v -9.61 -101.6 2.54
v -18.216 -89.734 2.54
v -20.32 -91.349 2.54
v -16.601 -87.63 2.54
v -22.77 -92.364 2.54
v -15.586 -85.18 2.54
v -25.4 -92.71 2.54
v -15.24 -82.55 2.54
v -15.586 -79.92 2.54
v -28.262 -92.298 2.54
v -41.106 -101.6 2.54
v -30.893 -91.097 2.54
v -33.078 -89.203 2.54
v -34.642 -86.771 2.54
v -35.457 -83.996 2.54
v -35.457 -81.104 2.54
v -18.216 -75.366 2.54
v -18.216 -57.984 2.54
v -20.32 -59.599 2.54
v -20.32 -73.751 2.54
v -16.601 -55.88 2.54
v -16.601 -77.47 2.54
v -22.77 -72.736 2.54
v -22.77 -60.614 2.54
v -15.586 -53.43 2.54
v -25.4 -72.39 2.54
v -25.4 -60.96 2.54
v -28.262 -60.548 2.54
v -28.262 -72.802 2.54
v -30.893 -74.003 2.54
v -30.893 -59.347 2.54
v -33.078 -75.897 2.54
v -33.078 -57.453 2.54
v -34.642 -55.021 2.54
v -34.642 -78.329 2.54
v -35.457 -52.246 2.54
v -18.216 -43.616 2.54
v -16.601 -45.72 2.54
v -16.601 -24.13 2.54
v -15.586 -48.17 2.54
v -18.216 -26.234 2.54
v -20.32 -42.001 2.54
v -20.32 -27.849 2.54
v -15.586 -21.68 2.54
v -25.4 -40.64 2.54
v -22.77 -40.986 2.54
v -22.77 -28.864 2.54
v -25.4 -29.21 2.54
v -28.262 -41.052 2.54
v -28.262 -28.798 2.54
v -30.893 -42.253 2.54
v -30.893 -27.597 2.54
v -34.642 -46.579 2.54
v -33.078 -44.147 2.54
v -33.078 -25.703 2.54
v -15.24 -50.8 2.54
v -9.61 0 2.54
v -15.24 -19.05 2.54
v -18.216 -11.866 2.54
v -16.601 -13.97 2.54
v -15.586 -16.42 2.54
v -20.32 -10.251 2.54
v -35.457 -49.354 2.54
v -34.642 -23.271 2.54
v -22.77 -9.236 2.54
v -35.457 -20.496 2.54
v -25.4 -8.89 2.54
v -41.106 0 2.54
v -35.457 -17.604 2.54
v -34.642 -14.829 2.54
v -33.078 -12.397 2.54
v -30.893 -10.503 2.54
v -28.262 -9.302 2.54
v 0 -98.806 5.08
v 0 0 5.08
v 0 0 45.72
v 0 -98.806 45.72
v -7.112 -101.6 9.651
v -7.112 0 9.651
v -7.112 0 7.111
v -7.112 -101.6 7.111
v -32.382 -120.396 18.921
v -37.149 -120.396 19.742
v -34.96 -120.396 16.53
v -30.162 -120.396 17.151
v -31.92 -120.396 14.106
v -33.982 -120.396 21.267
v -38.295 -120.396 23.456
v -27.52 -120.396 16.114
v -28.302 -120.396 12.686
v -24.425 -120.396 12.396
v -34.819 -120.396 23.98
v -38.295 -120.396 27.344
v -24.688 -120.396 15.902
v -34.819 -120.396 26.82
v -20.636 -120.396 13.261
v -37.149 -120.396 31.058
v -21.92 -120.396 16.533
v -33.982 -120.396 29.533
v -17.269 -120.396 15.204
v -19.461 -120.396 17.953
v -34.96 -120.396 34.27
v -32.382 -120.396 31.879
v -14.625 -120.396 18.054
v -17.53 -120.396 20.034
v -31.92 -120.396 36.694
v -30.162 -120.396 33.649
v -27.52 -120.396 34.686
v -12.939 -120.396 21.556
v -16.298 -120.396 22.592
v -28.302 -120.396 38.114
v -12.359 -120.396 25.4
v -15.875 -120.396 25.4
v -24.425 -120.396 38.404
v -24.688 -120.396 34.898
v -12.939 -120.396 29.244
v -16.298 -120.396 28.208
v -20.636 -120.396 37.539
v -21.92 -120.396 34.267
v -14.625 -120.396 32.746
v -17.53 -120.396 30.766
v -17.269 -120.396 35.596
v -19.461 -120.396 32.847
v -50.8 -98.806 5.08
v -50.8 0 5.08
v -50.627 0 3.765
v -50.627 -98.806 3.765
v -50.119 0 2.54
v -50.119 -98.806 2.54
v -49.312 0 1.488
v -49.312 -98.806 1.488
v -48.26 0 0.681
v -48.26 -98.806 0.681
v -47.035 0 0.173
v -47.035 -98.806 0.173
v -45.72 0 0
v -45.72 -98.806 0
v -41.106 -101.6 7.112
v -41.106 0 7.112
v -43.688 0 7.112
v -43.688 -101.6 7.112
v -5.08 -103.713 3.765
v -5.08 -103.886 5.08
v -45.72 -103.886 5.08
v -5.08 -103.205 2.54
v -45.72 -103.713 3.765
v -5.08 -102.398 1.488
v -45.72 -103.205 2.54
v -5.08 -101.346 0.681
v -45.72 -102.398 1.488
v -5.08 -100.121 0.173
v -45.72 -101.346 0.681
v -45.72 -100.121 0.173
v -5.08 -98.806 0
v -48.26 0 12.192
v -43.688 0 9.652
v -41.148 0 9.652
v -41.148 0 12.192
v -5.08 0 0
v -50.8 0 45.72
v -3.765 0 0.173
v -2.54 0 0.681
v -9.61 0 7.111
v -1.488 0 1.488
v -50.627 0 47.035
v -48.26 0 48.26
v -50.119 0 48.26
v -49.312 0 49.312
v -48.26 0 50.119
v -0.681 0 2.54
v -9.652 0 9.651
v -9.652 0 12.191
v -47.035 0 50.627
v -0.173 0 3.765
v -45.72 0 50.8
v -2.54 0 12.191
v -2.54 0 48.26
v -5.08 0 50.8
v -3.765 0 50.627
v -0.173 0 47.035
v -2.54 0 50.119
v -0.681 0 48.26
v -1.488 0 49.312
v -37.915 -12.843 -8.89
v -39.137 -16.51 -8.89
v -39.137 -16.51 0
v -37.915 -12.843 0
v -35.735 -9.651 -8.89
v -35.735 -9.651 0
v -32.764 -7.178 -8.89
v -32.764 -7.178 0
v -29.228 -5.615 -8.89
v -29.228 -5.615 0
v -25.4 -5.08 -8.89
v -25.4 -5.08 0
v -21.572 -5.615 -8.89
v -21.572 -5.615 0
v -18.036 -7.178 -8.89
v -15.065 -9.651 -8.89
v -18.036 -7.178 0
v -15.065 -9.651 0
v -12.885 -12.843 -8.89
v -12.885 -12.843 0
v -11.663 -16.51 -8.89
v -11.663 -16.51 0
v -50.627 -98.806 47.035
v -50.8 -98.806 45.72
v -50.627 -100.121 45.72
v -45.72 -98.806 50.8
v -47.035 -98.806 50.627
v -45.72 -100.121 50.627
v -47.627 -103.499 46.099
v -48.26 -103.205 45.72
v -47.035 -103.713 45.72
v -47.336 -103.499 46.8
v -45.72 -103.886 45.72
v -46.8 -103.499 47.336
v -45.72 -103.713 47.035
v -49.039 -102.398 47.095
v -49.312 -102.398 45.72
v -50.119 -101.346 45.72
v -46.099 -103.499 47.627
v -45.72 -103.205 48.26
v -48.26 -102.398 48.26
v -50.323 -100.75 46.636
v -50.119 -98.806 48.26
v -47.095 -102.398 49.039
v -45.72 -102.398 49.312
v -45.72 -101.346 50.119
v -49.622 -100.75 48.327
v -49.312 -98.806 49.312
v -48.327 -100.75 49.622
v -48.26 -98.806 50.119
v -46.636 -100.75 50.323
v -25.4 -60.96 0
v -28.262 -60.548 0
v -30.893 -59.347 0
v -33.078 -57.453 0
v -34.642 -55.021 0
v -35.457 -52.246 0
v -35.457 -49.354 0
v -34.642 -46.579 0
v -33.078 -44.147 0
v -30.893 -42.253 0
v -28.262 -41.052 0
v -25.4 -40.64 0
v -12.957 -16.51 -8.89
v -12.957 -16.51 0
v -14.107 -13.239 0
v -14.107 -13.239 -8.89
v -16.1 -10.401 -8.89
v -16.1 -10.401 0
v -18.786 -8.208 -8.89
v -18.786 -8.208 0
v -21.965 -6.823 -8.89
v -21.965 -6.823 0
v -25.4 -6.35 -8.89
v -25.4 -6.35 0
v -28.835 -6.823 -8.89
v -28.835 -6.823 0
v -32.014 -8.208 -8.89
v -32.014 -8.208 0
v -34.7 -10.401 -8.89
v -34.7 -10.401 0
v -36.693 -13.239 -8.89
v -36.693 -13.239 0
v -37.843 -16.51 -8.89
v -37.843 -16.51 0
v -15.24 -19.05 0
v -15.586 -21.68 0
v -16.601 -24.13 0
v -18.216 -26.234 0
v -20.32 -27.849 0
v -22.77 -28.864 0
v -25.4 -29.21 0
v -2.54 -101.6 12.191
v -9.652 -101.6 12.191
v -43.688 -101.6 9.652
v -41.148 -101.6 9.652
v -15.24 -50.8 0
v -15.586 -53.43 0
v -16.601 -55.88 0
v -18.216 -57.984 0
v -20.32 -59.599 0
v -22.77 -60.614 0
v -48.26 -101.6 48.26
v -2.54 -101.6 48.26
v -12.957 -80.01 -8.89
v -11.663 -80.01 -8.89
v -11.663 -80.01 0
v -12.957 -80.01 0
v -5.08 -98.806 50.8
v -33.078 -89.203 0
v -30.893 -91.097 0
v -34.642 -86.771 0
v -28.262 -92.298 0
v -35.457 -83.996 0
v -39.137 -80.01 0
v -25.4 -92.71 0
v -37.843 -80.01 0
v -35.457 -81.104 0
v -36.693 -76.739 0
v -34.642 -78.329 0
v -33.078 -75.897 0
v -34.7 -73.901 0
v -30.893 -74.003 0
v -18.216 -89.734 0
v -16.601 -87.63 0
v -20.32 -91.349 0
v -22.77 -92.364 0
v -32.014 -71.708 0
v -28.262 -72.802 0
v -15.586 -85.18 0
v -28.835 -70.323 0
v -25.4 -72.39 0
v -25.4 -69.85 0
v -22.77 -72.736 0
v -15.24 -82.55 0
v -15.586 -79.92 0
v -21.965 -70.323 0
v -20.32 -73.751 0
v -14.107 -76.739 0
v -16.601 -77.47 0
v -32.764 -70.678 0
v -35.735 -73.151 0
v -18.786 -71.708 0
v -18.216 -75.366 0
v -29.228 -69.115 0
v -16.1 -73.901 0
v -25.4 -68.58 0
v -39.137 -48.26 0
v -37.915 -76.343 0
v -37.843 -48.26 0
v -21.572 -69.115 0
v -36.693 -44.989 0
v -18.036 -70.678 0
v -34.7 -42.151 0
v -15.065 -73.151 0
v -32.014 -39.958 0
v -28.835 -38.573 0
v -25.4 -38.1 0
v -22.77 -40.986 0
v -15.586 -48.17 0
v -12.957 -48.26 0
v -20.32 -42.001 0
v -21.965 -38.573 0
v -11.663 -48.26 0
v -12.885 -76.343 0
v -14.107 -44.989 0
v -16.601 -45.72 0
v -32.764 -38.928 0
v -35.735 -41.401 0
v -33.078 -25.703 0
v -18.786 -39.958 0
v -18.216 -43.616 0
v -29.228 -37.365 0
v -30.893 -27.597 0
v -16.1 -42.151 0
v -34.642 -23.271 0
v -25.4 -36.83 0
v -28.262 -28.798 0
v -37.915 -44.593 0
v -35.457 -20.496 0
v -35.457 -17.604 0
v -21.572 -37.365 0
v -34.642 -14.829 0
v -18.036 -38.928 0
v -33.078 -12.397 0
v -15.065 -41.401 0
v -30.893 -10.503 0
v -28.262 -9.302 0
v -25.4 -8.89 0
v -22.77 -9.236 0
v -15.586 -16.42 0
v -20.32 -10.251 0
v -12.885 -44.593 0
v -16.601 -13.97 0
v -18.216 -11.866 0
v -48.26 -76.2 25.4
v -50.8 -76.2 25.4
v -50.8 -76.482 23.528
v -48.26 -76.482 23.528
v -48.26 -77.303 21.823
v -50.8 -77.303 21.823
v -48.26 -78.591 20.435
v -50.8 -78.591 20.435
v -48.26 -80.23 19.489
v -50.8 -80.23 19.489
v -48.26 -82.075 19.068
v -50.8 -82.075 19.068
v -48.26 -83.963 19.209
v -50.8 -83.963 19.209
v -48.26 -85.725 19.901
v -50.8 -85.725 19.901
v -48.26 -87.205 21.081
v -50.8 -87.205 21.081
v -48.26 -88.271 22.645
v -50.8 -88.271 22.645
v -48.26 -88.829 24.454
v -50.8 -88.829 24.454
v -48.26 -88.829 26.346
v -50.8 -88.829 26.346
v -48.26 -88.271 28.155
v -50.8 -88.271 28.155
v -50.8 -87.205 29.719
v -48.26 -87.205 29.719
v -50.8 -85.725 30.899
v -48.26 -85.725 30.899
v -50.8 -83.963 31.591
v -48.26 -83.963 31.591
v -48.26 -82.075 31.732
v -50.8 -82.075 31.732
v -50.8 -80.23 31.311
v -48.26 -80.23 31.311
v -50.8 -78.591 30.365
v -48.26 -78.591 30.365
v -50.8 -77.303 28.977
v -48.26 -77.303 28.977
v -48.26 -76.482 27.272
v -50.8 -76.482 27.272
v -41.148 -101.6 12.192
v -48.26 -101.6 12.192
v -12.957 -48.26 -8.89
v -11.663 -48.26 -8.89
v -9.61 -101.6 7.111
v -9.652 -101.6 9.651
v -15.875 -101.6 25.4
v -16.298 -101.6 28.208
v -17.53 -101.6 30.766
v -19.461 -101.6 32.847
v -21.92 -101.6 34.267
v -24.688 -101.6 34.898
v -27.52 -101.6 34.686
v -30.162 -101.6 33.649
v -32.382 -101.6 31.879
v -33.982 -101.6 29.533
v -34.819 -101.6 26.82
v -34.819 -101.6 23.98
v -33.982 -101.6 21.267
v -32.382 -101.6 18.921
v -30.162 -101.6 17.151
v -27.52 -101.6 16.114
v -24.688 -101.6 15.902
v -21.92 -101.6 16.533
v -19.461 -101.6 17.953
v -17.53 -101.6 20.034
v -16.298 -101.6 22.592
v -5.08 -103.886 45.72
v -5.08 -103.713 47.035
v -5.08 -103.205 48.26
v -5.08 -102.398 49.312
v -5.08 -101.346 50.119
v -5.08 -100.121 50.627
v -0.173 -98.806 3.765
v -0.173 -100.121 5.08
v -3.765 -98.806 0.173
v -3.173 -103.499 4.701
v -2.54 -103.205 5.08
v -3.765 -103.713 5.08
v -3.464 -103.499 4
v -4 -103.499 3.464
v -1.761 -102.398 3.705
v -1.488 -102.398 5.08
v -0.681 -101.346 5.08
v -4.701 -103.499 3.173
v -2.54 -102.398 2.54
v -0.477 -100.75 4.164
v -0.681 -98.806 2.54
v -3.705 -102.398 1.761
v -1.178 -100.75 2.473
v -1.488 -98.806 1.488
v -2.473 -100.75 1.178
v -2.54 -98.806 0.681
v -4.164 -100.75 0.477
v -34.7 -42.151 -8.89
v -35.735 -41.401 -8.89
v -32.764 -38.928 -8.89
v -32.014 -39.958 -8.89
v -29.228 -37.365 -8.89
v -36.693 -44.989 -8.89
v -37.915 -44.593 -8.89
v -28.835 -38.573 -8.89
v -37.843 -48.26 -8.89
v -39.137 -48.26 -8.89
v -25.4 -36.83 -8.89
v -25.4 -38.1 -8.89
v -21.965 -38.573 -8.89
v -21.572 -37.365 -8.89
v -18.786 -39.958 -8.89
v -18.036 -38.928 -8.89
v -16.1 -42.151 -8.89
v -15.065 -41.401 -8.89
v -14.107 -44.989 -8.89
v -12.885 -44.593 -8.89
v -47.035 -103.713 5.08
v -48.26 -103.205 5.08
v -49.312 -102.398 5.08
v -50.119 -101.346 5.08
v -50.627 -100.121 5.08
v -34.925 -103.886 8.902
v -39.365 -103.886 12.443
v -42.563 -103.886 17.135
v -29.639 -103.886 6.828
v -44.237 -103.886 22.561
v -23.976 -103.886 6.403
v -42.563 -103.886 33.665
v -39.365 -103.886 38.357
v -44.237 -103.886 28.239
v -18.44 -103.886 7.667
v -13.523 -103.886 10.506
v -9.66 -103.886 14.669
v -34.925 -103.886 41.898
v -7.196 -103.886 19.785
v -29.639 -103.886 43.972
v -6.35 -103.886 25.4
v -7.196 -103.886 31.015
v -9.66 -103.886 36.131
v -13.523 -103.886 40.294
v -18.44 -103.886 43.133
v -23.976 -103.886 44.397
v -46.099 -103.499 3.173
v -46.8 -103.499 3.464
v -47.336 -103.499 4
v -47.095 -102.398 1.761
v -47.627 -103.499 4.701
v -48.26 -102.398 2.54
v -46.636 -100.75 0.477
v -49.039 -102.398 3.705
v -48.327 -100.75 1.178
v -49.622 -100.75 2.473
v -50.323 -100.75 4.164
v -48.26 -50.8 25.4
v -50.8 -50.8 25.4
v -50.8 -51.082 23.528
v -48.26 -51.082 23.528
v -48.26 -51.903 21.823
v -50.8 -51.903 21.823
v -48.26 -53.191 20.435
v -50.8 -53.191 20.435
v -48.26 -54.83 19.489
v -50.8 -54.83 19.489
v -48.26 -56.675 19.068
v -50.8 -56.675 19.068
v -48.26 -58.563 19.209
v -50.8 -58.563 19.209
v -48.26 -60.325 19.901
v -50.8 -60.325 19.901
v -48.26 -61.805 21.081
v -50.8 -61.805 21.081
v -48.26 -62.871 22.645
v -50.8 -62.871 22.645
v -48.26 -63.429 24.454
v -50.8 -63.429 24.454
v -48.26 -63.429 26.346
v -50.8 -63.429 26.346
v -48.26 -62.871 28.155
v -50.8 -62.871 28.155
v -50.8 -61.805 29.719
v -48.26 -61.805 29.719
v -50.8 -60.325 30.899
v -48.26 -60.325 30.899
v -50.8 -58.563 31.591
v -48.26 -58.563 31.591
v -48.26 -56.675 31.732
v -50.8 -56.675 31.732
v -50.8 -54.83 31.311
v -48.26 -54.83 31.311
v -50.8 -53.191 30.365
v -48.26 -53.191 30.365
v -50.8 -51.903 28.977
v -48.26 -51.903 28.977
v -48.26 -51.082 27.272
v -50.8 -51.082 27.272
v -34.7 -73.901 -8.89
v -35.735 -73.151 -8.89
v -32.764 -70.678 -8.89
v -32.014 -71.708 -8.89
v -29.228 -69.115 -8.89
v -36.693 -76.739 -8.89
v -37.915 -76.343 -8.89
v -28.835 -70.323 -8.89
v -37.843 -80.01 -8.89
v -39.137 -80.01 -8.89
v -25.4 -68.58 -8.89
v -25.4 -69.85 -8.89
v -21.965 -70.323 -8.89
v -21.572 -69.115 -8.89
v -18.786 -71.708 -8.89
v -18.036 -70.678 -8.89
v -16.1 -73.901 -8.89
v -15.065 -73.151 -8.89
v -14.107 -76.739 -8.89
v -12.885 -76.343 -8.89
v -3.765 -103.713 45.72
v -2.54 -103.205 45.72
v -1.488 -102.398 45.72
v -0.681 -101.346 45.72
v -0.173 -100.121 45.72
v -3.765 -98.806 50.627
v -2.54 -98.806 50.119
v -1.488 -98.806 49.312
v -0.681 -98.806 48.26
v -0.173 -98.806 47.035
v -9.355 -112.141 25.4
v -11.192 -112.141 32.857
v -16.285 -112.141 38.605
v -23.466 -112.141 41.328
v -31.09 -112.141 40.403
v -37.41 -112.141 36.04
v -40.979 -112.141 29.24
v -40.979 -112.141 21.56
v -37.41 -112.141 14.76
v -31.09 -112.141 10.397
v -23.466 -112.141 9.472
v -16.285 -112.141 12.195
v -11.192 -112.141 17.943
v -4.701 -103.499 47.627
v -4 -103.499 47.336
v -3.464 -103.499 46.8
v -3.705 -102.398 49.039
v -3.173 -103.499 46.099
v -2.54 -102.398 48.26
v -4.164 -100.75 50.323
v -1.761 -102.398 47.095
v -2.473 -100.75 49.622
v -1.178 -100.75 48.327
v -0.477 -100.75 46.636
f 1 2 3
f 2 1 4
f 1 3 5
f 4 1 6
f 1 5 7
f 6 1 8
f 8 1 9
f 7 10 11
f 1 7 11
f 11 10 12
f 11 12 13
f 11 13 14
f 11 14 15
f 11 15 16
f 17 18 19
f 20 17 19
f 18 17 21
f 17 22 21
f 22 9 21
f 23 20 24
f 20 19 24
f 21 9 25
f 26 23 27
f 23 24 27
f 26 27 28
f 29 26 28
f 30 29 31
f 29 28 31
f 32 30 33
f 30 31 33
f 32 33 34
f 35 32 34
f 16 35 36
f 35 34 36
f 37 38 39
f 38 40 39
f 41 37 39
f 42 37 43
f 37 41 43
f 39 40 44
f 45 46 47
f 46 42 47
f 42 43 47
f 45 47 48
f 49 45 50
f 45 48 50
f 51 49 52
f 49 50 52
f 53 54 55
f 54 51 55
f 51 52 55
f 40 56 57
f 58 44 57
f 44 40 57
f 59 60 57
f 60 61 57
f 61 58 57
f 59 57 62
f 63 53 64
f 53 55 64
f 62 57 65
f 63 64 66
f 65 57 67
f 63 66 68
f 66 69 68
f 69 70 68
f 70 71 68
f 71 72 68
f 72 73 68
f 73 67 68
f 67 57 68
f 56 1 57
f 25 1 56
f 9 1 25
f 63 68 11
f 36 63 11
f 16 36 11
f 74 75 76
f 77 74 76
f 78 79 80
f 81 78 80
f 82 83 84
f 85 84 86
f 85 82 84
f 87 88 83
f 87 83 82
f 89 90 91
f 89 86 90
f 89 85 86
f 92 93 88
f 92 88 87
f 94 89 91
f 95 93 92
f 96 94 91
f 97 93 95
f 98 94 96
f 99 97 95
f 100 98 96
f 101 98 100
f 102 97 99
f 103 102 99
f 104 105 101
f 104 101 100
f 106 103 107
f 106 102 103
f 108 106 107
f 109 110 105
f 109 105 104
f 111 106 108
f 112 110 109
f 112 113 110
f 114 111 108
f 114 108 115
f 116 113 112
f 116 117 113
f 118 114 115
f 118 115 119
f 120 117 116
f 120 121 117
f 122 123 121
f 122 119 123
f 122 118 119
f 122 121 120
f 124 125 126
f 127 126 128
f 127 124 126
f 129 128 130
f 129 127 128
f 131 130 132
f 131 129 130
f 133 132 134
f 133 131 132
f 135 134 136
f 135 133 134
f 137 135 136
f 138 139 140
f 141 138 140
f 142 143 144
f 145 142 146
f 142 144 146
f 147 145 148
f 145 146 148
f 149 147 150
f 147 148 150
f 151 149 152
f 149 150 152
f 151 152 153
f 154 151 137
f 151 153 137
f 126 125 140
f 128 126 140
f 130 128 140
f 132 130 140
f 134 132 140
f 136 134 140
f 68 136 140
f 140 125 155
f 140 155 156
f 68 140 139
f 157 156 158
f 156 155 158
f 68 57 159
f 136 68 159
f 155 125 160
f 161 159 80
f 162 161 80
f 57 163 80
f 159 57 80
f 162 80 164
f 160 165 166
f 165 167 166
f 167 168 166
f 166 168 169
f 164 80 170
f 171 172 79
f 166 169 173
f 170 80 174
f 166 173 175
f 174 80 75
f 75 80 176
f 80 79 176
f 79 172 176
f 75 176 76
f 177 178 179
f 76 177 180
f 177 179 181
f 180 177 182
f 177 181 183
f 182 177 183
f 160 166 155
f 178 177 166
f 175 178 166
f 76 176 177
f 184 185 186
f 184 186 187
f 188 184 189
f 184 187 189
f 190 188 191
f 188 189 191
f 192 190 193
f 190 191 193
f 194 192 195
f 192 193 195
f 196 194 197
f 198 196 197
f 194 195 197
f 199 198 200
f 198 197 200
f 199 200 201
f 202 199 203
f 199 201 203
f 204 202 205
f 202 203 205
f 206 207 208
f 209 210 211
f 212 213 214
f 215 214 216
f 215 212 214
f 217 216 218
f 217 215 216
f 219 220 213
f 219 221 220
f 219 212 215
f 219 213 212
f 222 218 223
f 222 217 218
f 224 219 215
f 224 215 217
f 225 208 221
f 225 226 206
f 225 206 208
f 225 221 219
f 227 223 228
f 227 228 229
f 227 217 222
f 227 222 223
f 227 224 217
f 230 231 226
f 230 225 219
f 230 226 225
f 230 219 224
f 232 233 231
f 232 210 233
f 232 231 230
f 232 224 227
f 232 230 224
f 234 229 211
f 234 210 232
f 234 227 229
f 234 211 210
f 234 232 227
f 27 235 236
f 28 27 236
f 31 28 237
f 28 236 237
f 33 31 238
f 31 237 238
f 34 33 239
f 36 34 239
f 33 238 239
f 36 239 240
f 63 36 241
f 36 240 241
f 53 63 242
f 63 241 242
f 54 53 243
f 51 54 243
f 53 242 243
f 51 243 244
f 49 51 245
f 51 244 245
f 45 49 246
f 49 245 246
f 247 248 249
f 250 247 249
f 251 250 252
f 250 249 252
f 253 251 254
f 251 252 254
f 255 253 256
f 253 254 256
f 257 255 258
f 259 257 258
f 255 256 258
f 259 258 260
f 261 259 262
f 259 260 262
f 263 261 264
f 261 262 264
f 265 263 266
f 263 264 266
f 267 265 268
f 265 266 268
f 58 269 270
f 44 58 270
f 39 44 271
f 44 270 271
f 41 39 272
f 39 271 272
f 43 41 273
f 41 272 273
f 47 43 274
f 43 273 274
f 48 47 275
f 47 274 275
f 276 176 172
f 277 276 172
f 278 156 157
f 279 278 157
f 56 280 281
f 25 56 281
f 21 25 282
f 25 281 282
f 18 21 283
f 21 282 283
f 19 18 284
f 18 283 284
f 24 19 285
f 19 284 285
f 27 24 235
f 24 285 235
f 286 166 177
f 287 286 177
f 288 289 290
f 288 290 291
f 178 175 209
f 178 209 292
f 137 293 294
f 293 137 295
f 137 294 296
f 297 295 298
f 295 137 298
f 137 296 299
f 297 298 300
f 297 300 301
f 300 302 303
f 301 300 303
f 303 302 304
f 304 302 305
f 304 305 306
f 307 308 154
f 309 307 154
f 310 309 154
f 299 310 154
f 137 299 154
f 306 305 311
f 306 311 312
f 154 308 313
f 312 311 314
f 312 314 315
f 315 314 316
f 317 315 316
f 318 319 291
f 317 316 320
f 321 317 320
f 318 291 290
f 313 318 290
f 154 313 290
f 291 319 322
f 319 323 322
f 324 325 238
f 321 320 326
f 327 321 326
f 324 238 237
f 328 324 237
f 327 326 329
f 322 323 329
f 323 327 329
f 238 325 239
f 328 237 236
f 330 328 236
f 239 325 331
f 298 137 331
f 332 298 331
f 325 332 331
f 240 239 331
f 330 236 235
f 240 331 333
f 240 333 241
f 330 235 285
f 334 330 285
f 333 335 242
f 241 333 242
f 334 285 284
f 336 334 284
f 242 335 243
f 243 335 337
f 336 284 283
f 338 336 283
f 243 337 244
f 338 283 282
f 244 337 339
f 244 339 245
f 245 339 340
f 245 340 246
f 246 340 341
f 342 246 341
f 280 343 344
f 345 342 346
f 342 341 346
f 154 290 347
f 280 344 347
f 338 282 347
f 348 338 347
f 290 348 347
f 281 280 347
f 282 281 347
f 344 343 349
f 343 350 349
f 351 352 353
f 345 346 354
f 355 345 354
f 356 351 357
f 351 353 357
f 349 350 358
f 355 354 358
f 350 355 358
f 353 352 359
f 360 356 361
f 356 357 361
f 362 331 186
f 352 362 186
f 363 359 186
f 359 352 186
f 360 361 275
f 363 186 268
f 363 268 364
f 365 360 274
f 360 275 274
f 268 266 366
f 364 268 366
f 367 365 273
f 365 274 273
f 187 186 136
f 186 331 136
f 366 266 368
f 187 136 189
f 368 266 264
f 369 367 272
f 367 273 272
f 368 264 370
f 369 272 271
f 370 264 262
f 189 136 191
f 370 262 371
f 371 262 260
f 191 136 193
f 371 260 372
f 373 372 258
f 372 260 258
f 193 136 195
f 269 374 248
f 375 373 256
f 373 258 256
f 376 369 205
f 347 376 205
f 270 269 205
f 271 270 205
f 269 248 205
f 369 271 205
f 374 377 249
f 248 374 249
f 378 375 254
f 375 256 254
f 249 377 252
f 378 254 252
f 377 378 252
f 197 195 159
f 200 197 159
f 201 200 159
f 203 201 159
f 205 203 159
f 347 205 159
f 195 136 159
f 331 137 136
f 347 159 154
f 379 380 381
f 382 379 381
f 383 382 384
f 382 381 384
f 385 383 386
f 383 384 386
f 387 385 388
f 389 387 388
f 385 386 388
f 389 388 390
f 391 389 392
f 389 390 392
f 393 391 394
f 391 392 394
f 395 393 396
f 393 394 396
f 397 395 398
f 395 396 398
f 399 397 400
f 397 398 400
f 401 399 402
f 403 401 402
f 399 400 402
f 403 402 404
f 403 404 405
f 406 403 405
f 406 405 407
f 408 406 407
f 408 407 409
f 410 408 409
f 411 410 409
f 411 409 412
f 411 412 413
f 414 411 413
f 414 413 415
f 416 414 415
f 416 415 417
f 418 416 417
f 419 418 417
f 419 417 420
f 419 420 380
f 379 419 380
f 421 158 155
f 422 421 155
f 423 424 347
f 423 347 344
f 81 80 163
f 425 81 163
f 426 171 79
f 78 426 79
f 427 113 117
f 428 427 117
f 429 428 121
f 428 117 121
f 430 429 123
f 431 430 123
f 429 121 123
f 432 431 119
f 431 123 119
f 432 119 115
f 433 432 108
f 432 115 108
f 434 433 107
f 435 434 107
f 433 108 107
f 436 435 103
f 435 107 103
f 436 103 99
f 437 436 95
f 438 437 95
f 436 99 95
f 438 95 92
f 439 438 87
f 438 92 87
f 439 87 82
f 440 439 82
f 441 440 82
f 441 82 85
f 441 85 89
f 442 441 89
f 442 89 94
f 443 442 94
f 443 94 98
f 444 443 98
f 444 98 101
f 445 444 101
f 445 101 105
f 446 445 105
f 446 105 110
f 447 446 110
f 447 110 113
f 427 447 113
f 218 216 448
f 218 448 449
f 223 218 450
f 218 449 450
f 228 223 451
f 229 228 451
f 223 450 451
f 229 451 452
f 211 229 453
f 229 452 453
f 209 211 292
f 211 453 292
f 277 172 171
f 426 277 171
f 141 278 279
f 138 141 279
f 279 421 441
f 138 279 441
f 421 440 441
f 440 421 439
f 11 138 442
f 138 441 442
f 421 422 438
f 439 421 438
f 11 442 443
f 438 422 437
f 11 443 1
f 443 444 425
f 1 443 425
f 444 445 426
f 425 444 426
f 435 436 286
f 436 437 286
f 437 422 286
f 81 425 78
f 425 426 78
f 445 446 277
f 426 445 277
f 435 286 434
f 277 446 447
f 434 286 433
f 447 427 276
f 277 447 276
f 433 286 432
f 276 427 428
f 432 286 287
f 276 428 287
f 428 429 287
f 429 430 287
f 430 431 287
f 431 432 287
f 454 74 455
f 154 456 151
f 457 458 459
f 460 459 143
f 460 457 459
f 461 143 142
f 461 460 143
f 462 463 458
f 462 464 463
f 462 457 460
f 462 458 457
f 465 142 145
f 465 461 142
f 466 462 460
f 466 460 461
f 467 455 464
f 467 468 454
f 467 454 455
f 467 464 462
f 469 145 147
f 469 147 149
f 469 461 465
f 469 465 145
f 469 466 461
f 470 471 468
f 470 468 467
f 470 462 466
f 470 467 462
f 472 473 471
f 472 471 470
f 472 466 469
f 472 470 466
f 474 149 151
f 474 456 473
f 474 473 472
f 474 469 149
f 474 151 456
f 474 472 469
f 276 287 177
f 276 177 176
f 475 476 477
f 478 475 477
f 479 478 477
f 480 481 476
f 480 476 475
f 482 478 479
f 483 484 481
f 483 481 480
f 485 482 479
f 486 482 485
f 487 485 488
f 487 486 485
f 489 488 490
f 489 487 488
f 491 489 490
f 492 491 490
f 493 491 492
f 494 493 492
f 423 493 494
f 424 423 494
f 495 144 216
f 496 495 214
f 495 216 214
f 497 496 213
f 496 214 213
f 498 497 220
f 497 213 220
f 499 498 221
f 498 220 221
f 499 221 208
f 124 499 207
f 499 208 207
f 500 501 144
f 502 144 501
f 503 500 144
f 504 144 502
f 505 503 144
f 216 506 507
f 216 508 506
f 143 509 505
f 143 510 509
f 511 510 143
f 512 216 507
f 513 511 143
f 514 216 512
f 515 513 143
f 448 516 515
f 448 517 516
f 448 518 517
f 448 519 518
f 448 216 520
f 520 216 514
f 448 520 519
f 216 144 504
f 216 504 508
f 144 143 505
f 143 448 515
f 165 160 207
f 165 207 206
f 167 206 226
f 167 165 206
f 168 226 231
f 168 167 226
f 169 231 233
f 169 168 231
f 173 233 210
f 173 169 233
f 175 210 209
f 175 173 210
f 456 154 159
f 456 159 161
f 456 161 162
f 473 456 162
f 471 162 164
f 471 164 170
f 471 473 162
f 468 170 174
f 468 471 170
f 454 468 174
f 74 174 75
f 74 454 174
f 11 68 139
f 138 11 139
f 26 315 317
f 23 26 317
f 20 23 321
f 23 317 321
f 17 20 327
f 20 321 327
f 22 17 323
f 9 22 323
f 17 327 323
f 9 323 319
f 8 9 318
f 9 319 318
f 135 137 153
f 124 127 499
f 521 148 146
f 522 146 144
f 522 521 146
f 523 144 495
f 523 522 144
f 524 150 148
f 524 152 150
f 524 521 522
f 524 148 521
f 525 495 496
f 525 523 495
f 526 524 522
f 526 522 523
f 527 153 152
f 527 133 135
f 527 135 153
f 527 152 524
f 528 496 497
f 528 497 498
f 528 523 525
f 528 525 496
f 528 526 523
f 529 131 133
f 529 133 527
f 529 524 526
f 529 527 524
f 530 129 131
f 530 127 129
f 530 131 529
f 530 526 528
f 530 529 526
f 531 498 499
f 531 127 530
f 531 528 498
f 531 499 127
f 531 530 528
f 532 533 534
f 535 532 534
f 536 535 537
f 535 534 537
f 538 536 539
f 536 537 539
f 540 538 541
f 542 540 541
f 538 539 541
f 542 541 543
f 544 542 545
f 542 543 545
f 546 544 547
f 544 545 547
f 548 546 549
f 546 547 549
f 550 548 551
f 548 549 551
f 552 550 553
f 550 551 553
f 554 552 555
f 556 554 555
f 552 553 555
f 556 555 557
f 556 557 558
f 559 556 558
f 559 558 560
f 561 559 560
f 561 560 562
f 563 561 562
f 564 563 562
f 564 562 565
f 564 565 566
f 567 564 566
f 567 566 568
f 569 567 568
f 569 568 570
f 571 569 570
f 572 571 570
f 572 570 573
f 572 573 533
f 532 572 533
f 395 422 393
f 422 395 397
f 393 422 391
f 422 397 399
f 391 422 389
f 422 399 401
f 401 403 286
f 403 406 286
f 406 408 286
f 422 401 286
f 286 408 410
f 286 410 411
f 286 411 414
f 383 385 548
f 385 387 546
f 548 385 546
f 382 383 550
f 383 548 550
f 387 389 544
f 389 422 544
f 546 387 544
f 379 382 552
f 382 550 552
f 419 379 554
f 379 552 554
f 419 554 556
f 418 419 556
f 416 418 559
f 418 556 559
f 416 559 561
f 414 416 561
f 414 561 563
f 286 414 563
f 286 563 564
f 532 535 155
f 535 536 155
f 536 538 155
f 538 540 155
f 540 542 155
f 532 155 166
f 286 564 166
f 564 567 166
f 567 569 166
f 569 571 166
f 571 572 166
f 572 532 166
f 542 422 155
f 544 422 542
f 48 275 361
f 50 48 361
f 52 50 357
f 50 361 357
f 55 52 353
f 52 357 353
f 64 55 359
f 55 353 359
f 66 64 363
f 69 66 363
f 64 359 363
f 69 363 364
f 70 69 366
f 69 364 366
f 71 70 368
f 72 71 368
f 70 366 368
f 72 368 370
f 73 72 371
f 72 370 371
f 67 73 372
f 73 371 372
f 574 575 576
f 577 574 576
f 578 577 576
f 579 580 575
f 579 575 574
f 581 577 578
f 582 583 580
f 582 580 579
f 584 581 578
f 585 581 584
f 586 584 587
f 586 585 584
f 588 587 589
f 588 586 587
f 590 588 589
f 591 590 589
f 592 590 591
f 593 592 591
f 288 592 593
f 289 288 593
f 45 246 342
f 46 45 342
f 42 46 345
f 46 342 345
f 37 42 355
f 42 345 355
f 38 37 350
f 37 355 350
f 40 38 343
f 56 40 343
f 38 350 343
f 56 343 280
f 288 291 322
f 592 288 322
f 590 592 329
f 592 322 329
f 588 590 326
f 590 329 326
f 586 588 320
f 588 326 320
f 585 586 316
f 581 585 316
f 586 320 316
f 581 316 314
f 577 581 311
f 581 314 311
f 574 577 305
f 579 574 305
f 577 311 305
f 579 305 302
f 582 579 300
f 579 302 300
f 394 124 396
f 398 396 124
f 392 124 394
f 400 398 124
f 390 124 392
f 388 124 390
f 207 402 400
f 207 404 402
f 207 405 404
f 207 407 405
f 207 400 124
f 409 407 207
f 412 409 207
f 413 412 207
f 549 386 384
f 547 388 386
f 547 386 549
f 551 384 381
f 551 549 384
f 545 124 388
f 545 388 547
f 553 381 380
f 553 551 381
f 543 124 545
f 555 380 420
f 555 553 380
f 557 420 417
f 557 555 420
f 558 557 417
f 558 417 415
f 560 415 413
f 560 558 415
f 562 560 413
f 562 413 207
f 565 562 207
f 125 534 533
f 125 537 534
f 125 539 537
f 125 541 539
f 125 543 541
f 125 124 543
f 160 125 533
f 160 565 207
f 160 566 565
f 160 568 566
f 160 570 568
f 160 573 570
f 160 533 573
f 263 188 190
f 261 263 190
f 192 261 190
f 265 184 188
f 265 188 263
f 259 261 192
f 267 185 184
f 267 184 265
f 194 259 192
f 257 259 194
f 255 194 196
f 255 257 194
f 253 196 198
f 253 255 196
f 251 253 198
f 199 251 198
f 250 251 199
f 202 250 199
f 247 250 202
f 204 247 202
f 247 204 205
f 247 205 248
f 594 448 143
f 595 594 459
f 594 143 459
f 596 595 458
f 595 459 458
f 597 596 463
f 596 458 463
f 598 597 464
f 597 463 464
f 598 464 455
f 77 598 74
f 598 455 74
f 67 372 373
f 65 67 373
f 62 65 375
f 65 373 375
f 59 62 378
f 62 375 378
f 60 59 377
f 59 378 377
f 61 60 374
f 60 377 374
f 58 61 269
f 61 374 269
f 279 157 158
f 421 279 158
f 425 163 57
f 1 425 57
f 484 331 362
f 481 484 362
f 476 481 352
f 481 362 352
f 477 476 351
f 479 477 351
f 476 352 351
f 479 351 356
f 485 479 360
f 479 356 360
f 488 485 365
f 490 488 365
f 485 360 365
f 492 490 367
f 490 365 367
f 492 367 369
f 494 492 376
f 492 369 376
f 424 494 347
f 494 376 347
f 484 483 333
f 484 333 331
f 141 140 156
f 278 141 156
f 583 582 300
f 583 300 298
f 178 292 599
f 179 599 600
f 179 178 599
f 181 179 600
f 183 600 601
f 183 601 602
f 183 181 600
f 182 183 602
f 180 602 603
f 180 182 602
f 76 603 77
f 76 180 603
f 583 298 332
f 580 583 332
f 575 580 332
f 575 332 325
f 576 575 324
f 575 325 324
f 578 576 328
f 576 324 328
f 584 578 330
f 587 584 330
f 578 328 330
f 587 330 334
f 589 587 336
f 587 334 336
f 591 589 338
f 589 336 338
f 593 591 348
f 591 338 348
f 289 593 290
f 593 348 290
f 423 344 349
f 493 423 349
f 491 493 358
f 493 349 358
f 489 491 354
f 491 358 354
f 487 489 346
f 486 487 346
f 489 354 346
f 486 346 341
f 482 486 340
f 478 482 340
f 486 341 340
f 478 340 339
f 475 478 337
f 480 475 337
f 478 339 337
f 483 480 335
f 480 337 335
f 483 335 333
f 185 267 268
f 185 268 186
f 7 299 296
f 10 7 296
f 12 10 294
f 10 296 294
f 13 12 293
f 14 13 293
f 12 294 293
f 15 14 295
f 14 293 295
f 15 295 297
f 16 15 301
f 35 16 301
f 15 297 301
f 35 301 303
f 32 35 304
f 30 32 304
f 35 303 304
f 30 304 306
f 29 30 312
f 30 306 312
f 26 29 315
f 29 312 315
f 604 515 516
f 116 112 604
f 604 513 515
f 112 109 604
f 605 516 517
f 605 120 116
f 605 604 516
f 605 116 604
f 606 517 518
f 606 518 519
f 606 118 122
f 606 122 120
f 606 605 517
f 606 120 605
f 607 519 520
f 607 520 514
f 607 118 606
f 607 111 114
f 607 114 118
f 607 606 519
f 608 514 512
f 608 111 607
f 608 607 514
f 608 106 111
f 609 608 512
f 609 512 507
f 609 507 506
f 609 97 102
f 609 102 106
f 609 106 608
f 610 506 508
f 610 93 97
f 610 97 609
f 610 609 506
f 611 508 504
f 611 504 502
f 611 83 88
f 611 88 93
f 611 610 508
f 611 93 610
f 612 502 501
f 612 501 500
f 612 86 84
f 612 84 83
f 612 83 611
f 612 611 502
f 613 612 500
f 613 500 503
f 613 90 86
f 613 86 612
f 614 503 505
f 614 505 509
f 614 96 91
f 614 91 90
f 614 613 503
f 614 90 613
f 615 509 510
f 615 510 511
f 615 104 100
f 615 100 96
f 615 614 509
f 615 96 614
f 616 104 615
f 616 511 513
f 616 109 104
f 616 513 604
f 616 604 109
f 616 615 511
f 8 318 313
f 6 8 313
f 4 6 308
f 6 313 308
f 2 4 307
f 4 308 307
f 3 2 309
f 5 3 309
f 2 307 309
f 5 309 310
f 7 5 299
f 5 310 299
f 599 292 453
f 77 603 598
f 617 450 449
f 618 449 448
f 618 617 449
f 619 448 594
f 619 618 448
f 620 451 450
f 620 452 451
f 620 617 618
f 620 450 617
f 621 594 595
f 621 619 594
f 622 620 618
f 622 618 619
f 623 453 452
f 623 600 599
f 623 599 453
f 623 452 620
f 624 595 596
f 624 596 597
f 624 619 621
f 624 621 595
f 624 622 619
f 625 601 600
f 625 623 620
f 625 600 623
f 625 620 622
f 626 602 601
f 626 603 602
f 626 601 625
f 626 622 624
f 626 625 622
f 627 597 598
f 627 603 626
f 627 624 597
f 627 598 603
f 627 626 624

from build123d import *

# Parameters (mm, degrees)
F0_W      = 50.8
F0_H      = 50.8
F1_DEPTH  = 101.6
F3_DEPTH  = 12.7
F5_DEPTH  = 25.4
F7_DEPTH  = 8.89
F8_W      = 50.8
F8_H      = 50.8
F9_DEPTH  = 2.286
F10_R     = 19.05
F11_DEPTH = 16.51
F11_TAPER = 20
F12_R     = 9.525
F13_DEPTH = 25.4
F14_R     = 5.08
F15_R     = 5.08


with BuildPart() as f1:
    # F0 (on Front) → F1 (new body)
    with BuildSketch(Plane.XZ):
        with Locations((-25.4, 25.4)):
            Rectangle(F0_W, F0_H)
        Polygon((-48.26, 12.192), (-48.26, 48.26), (-2.54, 48.26), (-2.54, 12.1909337732), (-9.652, 12.1909337732), (-9.652, 9.6509337732), (-7.112, 9.6509337732), (-7.112, 7.1109337732), (-9.6097155579, 7.1109337732), (-9.6097155579, 2.54), (-41.1057155579, 2.54), (-41.1057155579, 7.112), (-43.688, 7.112), (-43.688, 9.652), (-41.148, 9.652), (-41.148, 12.192), align=None, mode=Mode.SUBTRACT)
    extrude(amount=F1_DEPTH)

    # F2 (on face) → F3 (cut)
    with BuildSketch(Plane(origin=(-50.8, 0, 0), x_dir=(0, -1, 0), z_dir=(-1, 0, 0))):
        with BuildLine():
            ThreePointArc((63.5, 25.4), (57.15, 31.75), (50.8, 25.4))
            Line((50.8, 25.4), (63.5, 25.4))
        make_face()
        with BuildLine():
            ThreePointArc((88.9, 25.4), (82.55, 31.75), (76.2, 25.4))
            Line((76.2, 25.4), (88.9, 25.4))
        make_face()
        with BuildLine():
            Line((88.9, 25.4), (76.2, 25.4))
            ThreePointArc((76.2, 25.4), (82.55, 19.05), (88.9, 25.4))
        make_face()
        with BuildLine():
            Line((63.5, 25.4), (50.8, 25.4))
            ThreePointArc((50.8, 25.4), (57.15, 19.05), (63.5, 25.4))
        make_face()
    extrude(amount=-F3_DEPTH, mode=Mode.SUBTRACT)

    # F4 (on face) → F5 (cut)
    with BuildSketch(Plane(origin=(0, 0, 0), x_dir=(1, 0, 0), z_dir=(0, 0, -1))):
        with BuildLine():
            ThreePointArc((-25.4, 29.21), (-35.56, 19.05), (-25.4, 8.89))
            Line((-25.4, 8.89), (-25.4, 29.21))
        make_face()
        with BuildLine():
            ThreePointArc((-25.4, 92.71), (-35.56, 82.55), (-25.4, 72.39))
            Line((-25.4, 72.39), (-25.4, 92.71))
        make_face()
        with BuildLine():
            Line((-25.4, 92.71), (-25.4, 72.39))
            ThreePointArc((-25.4, 72.39), (-18.2157951031, 75.3657951031), (-15.24, 82.55))
            ThreePointArc((-15.24, 82.55), (-18.2157951031, 89.7342048969), (-25.4, 92.71))
        make_face()
        with BuildLine():
            ThreePointArc((-25.4, 60.96), (-35.56, 50.8), (-25.4, 40.64))
            Line((-25.4, 40.64), (-25.4, 60.96))
        make_face()
        with BuildLine():
            Line((-25.4, 60.96), (-25.4, 40.64))
            ThreePointArc((-25.4, 40.64), (-18.2157951031, 43.6157951031), (-15.24, 50.8))
            ThreePointArc((-15.24, 50.8), (-18.2157951031, 57.9842048969), (-25.4, 60.96))
        make_face()
        with BuildLine():
            Line((-25.4, 29.21), (-25.4, 8.89))
            ThreePointArc((-25.4, 8.89), (-18.2157951031, 11.8657951031), (-15.24, 19.05))
            ThreePointArc((-15.24, 19.05), (-18.2157951031, 26.2342048969), (-25.4, 29.21))
        make_face()
    extrude(amount=-F5_DEPTH, mode=Mode.SUBTRACT)

    # F6 (on face) → F7 (join)
    with BuildSketch(Plane(origin=(0, 0, 0), x_dir=(1, 0, 0), z_dir=(0, 0, -1))):
        with BuildLine():
            ThreePointArc((-12.9565921067, 16.51), (-25.4, 6.35), (-37.8434078933, 16.51))
            Line((-37.8434078933, 16.51), (-39.1371503595, 16.51))
            ThreePointArc((-39.1371503595, 16.51), (-25.4, 5.08), (-11.6628496405, 16.51))
            Line((-11.6628496405, 16.51), (-12.9565921067, 16.51))
        make_face()
        with BuildLine():
            ThreePointArc((-12.9565921067, 48.26), (-25.4, 38.1), (-37.8434078933, 48.26))
            Line((-37.8434078933, 48.26), (-39.1371503595, 48.26))
            ThreePointArc((-39.1371503595, 48.26), (-25.4, 36.83), (-11.6628496405, 48.26))
            Line((-11.6628496405, 48.26), (-12.9565921067, 48.26))
        make_face()
        with BuildLine():
            ThreePointArc((-12.9565921067, 80.01), (-25.4, 69.85), (-37.8434078933, 80.01))
            Line((-37.8434078933, 80.01), (-39.1371503595, 80.01))
            ThreePointArc((-39.1371503595, 80.01), (-25.4, 68.58), (-11.6628496405, 80.01))
            Line((-11.6628496405, 80.01), (-12.9565921067, 80.01))
        make_face()
    extrude(amount=F7_DEPTH)

    # F8 (on face) → F9 (join)
    with BuildSketch(Plane.XZ.offset(101.6)):
        with Locations((-25.4, 25.4)):
            Rectangle(F8_W, F8_H)
    extrude(amount=F9_DEPTH)

    # F10 (on face) → F11 (join)
    with BuildSketch(Plane.XZ.offset(103.886)):
        with Locations((-25.4, 25.4)):
            Circle(F10_R)
    extrude(amount=F11_DEPTH, taper=F11_TAPER)

    # F12 (on face) → F13 (cut)
    with BuildSketch(Plane.XZ.offset(120.396)):
        with Locations((-25.4, 25.4)):
            Circle(F12_R)
    extrude(amount=-F13_DEPTH, mode=Mode.SUBTRACT)

    # F14
    f14_edges = [f1.edges().sort_by_distance(p)[0] for p in [
        (0, -51.943, 0),
        (-50.8, -51.943, 0),
        (-50.8, -51.943, 50.8),
        (0, -51.943, 50.8),
    ]]
    fillet(f14_edges, radius=F14_R)

    # F15
    f15_edges = [f1.edges().sort_by_distance(p)[0] for p in [
        (-25.4, -103.886, 50.8),
    ]]
    fillet(f15_edges, radius=F15_R)


solid = f1.part
